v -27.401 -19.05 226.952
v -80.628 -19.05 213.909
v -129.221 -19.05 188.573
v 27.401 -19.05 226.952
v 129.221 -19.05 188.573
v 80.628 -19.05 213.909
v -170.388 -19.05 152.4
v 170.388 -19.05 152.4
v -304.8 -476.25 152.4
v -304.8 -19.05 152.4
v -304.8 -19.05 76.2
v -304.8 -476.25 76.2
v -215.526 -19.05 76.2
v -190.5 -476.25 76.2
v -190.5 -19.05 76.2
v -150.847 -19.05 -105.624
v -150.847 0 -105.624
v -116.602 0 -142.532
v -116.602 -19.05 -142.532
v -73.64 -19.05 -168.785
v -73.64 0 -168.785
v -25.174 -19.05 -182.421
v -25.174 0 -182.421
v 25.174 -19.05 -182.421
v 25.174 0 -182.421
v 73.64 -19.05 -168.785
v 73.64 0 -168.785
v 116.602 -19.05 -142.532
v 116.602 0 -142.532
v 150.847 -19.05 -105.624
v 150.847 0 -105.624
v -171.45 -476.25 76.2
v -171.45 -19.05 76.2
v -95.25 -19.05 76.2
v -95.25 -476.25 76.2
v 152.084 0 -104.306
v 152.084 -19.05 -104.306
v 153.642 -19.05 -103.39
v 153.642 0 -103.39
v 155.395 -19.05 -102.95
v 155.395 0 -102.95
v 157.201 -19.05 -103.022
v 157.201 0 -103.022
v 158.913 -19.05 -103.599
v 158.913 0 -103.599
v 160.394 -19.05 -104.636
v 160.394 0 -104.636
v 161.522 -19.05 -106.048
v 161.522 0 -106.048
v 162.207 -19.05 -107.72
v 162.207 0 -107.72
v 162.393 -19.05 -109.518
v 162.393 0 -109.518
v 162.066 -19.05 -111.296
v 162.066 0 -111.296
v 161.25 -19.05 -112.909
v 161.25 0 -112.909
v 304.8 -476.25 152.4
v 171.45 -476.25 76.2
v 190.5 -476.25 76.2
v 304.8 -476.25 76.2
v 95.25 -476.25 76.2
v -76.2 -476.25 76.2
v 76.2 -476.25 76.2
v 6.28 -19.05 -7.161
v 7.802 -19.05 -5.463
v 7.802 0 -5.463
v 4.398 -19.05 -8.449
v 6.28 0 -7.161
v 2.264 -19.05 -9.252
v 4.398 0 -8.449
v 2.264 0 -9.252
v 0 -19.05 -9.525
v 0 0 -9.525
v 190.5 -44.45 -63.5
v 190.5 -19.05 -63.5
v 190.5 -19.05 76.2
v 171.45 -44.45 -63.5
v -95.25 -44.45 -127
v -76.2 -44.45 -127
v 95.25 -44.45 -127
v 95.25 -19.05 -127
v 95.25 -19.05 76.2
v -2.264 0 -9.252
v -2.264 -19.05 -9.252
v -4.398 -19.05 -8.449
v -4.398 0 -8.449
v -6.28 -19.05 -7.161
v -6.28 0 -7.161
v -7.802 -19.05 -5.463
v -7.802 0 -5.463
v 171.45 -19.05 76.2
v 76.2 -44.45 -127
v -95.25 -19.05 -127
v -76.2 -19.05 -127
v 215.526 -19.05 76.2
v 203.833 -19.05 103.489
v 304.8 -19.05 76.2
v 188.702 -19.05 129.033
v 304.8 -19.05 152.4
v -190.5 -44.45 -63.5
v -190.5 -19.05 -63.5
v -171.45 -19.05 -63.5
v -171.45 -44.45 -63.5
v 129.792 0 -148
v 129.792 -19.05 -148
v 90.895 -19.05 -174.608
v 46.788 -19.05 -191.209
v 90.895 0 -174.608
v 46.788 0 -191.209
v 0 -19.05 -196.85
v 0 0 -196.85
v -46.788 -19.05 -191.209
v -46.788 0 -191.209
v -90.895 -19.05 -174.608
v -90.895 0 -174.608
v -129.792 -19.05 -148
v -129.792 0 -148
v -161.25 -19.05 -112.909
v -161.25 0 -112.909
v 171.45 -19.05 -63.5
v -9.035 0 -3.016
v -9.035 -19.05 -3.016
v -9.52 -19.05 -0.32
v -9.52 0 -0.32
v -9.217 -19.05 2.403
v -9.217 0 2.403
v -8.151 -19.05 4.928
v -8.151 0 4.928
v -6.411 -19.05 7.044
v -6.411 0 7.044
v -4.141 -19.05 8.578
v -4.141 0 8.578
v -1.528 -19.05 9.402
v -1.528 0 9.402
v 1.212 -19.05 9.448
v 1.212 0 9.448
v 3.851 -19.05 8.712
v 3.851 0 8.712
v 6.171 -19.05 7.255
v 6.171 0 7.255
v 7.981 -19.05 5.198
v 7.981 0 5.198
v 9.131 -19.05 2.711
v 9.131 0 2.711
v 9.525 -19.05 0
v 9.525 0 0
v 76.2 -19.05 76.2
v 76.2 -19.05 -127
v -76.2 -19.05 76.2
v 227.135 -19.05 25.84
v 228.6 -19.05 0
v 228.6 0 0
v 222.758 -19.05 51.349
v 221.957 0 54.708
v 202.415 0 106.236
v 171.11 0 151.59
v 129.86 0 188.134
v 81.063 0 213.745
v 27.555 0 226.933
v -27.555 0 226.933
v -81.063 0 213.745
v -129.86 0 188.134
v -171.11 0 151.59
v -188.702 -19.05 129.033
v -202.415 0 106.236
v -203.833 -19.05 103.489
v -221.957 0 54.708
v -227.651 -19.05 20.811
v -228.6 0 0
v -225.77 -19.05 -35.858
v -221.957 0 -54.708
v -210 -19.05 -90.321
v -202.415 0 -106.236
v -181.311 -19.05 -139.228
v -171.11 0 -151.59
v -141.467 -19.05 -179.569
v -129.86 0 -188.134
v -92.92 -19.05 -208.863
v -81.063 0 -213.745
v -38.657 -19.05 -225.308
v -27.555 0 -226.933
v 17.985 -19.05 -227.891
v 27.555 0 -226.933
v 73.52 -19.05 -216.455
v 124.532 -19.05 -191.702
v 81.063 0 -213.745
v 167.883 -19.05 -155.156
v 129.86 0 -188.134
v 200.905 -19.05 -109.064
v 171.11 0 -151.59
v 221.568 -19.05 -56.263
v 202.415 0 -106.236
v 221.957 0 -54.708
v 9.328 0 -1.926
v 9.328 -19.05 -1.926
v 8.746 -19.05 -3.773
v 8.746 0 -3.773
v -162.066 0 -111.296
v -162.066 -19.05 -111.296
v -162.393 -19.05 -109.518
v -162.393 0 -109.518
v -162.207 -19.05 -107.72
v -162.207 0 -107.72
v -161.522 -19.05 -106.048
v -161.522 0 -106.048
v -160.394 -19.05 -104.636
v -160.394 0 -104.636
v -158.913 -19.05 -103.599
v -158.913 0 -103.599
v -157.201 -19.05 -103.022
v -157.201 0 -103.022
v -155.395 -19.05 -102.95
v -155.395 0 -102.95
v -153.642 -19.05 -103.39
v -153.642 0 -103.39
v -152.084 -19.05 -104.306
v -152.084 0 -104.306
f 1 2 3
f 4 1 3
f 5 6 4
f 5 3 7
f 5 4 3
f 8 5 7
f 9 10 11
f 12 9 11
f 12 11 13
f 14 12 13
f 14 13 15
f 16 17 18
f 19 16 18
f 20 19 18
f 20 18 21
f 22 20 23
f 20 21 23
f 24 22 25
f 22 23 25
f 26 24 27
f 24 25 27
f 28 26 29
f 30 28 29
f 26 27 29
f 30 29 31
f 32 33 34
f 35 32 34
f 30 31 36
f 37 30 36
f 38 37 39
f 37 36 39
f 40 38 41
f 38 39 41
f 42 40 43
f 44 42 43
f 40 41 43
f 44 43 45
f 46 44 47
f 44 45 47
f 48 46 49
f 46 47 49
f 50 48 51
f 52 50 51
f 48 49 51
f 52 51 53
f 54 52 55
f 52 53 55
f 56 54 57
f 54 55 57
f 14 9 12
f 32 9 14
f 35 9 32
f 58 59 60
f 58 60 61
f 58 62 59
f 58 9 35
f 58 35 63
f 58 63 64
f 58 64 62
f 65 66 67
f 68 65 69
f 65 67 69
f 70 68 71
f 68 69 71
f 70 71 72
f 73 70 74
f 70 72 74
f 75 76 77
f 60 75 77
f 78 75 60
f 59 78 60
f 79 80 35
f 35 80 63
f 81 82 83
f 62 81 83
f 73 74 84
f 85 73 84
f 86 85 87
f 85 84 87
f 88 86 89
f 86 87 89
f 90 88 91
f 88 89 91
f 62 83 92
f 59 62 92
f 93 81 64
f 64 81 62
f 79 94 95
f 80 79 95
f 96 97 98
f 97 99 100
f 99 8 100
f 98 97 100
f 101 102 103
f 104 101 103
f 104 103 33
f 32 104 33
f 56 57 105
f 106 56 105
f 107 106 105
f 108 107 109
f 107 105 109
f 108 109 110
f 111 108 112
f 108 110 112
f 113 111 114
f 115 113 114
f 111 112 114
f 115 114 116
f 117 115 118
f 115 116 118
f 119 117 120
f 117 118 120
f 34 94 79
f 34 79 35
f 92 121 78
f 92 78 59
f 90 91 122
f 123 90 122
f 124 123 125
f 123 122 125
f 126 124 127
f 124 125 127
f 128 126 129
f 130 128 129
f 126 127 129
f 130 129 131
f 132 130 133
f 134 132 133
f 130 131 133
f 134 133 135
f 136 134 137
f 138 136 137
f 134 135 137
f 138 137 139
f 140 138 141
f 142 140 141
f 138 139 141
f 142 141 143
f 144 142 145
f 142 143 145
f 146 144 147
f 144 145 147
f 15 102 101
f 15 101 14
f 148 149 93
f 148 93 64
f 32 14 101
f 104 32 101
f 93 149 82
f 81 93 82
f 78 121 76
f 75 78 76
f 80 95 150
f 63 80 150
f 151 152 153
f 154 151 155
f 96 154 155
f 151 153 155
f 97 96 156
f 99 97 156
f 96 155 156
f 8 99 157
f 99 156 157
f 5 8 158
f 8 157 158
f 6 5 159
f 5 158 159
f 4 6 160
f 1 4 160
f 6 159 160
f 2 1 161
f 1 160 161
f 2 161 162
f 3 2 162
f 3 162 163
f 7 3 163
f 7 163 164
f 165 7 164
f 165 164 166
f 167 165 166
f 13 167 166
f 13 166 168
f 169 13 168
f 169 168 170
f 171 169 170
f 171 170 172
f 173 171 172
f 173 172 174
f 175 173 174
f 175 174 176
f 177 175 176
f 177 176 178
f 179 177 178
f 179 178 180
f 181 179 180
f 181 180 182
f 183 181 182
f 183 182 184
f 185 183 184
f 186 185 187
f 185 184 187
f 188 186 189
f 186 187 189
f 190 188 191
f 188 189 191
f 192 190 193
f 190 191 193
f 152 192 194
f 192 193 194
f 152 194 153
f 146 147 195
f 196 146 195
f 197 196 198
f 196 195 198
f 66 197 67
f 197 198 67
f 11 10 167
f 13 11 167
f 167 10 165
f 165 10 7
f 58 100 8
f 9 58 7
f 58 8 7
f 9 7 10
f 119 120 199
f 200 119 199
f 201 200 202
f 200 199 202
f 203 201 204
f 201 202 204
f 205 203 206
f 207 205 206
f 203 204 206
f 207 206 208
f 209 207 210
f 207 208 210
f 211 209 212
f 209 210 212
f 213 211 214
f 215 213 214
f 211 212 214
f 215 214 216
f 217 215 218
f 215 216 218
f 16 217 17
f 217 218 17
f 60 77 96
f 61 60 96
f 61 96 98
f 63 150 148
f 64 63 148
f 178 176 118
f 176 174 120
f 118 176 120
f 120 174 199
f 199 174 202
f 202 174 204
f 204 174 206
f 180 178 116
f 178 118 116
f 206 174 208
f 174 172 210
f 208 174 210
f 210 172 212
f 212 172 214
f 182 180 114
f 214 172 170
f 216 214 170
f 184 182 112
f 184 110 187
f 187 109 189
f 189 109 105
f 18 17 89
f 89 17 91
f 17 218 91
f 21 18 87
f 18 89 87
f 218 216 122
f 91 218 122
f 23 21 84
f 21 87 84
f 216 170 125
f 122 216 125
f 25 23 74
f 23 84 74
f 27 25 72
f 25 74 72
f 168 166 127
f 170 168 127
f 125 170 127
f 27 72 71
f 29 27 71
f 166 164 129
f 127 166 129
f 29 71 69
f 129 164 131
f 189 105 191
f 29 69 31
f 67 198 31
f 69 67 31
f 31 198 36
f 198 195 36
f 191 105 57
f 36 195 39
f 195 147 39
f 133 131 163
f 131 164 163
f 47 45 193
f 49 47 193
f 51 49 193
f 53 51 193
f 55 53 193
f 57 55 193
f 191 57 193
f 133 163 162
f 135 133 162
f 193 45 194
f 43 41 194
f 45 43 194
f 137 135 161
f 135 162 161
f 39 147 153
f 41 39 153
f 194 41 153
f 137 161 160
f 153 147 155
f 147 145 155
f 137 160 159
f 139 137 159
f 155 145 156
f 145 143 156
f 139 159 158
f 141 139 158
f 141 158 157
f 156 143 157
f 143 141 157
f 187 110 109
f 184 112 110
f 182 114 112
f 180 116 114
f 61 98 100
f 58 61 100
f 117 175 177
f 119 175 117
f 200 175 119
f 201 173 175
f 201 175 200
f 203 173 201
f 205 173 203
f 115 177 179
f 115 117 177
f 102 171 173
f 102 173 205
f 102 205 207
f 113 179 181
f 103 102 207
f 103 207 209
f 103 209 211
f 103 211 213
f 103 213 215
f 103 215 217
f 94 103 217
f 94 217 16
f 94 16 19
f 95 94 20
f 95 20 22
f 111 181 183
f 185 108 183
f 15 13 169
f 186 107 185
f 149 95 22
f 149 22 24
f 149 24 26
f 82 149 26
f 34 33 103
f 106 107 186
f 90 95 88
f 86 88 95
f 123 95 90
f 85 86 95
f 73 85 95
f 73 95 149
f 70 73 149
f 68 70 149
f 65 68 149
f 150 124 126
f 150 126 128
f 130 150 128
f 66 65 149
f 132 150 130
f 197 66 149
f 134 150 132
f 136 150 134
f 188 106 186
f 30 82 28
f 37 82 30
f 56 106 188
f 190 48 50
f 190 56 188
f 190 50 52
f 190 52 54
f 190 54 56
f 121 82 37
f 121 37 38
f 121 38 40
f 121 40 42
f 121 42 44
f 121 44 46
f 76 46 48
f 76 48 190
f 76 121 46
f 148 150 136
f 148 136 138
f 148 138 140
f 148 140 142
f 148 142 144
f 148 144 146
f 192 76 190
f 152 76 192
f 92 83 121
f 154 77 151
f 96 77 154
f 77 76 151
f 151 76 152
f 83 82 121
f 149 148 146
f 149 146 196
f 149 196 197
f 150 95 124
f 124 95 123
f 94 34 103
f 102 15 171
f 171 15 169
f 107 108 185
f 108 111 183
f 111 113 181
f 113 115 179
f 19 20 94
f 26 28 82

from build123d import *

# Parameters (mm, degrees)
F0_R      = 228.6
F1_DEPTH  = 19.05
F2_W      = 19.05
F2_H      = 139.7
F2_H_2    = 203.2
F3_DEPTH  = 457.2
F5_DEPTH  = 25.4
F7_DEPTH  = 25.4
F9_DEPTH  = 25.4
F11_DEPTH = 25.4


with BuildPart() as f1:
    # F0 (on Front) → F1 (new body)
    with BuildSketch(Plane.XZ):
        Circle(F0_R)
        with BuildLine():
            ThreePointArc((161.25008, -112.908521), (0, -196.85), (-161.25008, -112.908521))
            ThreePointArc((-161.25008, -112.908521), (-159.690675, -104.064696), (-150.846849, -105.624101))
            ThreePointArc((-150.846849, -105.624101), (0, -184.15), (150.846849, -105.624101))
            ThreePointArc((150.846849, -105.624101), (159.690675, -104.064696), (161.25008, -112.908521))
        make_face(mode=Mode.SUBTRACT)
        with BuildLine():
            ThreePointArc((-7.802423, -5.463316), (-2.864223, 9.084154), (9.525, 0))
            ThreePointArc((9.525, 0), (9.084154, -2.864223), (7.802423, -5.463316))
            ThreePointArc((7.802423, -5.463316), (4.398156, -8.448778), (0, -9.525))
            ThreePointArc((0, -9.525), (-4.398156, -8.448778), (-7.802423, -5.463316))
        make_face(mode=Mode.SUBTRACT)
    extrude(amount=F1_DEPTH)

    # F2 (on face) → F3 (join)
    with BuildSketch(Plane.XZ.offset(19.05)):
        with BuildLine():
            Line((304.8, 152.4), (170.38838, 152.4))
            ThreePointArc((170.38838, 152.4), (196.682779, 116.506843), (215.526147, 76.2))
            Line((215.526147, 76.2), (304.8, 76.2))
            Line((304.8, 76.2), (304.8, 152.4))
        make_face()
        with BuildLine():
            Line((170.38838, 152.4), (-170.38838, 152.4))
            ThreePointArc((-170.38838, 152.4), (-196.682779, 116.506843), (-215.526147, 76.2))
            Line((-215.526147, 76.2), (-190.5, 76.2))
            Line((-190.5, 76.2), (-171.45, 76.2))
            Line((-171.45, 76.2), (-95.25, 76.2))
            Line((-95.25, 76.2), (-76.2, 76.2))
            Line((-76.2, 76.2), (76.2, 76.2))
            Line((76.2, 76.2), (95.25, 76.2))
            Line((95.25, 76.2), (171.45, 76.2))
            Line((171.45, 76.2), (190.5, 76.2))
            Line((190.5, 76.2), (215.526147, 76.2))
            ThreePointArc((215.526147, 76.2), (196.682779, 116.506843), (170.38838, 152.4))
        make_face()
        with BuildLine():
            Line((-170.38838, 152.4), (-304.8, 152.4))
            Line((-304.8, 152.4), (-304.8, 76.2))
            Line((-304.8, 76.2), (-215.526147, 76.2))
            ThreePointArc((-215.526147, 76.2), (-196.682779, 116.506843), (-170.38838, 152.4))
        make_face()
        with Locations((-180.975, 6.35)):
            Rectangle(F2_W, F2_H)
        with Locations((-85.725, -25.4)):
            Rectangle(F2_W, F2_H_2)
        with Locations((85.725, -25.4)):
            Rectangle(F2_W, F2_H_2)
        with Locations((180.975, 6.35)):
            Rectangle(F2_W, F2_H)
    extrude(amount=F3_DEPTH)

    # F4 (on face) → F5 (cut)
    with BuildSketch(Plane.YZ.offset(190.5)):
        Polygon((-44.45, -63.5), (-476.25, 76.2), (-476.25, -63.5), align=None)
    extrude(amount=-F5_DEPTH, mode=Mode.SUBTRACT)

    # F6 (on face) → F7 (cut)
    with BuildSketch(Plane.YZ.offset(95.25)):
        Polygon((-44.45, -127), (-476.25, 76.2), (-476.25, -127), align=None)
    extrude(amount=-F7_DEPTH, mode=Mode.SUBTRACT)

    # F8 (on face) → F9 (cut)
    with BuildSketch(Plane.YZ.offset(-76.2)):
        Polygon((-44.45, -127), (-476.25, 76.2), (-476.25, -127), align=None)
    extrude(amount=-F9_DEPTH, mode=Mode.SUBTRACT)

    # F10 (on face) → F11 (cut)
    with BuildSketch(Plane(origin=(-190.5, 0, 0), x_dir=(0, -1, 0), z_dir=(-1, 0, 0))):
        Polygon((476.25, -63.5), (476.25, 76.2), (44.45, -63.5), align=None)
    extrude(amount=-F11_DEPTH, mode=Mode.SUBTRACT)


solid = f1.part
